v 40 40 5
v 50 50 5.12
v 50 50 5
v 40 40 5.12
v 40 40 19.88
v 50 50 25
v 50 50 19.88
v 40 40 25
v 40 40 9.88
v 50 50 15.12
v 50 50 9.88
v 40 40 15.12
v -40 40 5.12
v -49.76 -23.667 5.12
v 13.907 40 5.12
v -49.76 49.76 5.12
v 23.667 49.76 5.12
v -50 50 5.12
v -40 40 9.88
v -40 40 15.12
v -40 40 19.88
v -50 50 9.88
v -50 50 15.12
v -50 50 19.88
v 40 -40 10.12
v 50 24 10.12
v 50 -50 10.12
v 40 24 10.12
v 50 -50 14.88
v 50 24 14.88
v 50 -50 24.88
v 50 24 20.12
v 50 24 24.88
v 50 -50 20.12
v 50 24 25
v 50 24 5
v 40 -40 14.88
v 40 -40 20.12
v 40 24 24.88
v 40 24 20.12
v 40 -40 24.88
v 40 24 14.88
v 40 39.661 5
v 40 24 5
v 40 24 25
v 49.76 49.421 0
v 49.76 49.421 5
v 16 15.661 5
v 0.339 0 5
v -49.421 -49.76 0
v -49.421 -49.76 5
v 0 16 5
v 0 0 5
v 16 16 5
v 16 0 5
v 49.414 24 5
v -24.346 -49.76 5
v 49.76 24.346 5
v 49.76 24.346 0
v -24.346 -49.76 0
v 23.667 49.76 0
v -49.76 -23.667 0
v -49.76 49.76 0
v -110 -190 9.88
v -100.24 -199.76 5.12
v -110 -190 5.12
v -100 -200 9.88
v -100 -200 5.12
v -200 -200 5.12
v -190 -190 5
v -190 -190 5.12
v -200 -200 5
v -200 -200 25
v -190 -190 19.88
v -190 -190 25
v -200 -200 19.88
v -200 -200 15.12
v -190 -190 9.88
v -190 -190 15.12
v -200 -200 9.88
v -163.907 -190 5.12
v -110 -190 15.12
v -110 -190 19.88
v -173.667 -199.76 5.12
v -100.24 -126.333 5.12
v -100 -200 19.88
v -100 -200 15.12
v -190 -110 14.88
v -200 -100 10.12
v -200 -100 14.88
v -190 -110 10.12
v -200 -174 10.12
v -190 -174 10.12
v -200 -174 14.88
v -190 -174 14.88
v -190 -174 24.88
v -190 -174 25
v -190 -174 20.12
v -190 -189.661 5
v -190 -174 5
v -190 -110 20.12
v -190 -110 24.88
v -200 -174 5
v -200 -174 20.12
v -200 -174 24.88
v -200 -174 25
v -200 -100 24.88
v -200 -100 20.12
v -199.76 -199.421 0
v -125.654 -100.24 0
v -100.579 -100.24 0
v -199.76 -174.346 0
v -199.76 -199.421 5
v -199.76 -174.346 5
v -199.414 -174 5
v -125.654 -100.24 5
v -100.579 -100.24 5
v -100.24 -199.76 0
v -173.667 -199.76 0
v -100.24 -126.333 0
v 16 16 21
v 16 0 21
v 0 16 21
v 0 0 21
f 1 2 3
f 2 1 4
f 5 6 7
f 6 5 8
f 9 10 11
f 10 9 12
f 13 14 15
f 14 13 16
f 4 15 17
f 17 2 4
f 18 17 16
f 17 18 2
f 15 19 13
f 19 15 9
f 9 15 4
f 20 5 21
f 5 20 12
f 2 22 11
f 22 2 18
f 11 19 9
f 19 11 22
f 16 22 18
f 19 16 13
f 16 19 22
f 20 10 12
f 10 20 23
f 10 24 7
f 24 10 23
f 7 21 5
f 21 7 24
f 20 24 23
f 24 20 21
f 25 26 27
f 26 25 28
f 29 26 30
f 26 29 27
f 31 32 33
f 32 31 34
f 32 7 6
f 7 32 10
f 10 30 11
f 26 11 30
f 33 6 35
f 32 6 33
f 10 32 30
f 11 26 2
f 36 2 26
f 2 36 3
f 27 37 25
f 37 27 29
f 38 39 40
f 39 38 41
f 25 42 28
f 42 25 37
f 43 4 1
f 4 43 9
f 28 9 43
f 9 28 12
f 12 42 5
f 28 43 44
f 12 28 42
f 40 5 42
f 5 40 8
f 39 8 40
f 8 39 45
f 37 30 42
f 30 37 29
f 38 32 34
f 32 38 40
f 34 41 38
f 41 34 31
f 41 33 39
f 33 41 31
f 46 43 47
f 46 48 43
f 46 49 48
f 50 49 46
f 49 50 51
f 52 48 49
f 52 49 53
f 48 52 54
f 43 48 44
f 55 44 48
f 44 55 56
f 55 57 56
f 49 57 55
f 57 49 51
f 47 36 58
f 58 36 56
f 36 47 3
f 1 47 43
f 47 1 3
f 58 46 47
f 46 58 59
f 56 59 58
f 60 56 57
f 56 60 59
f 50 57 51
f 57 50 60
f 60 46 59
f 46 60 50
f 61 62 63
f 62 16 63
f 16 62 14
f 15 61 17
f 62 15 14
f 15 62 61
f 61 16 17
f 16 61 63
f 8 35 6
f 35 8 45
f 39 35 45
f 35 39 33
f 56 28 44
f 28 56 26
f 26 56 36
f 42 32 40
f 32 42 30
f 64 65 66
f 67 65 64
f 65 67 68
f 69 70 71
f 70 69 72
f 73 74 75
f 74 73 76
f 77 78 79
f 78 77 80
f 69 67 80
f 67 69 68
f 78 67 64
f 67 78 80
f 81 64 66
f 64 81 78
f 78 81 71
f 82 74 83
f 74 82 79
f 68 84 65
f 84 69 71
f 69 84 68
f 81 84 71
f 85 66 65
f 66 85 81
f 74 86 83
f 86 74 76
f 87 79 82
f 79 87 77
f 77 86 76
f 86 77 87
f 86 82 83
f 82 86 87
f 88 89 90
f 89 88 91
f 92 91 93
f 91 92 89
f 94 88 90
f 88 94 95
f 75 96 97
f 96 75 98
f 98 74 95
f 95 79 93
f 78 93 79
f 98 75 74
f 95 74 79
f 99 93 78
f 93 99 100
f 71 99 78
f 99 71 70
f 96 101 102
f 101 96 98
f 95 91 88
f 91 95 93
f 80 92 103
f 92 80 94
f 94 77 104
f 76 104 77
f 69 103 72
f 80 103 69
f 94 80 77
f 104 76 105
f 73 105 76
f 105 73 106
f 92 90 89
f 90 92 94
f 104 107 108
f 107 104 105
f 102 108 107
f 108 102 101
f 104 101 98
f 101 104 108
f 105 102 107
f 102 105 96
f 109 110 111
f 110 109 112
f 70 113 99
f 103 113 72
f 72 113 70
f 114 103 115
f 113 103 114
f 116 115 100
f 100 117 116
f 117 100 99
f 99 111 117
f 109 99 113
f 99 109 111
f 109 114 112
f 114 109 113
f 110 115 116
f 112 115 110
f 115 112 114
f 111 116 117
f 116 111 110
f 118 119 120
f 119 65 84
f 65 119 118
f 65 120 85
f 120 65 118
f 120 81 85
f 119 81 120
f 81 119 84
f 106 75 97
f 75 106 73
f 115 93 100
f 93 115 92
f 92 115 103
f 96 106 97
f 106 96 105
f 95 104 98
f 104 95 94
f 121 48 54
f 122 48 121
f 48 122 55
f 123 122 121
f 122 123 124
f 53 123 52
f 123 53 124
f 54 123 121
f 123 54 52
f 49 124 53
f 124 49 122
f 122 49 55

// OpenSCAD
//
// Tangible Math Project - Square Packing
// Overlapping corners: third model concept
//
// Andrew H. Volk, Liberty University.  Released under CC BY 4.0.
// Release 1.0.0, 23 October 2026.  Source unchanged from the working copy of
// 9 April 2026; only this header has been added.
//
// Two congruent plates, each a trapezoid plus a right triangle, carrying
// raised trapezoidal border bars that interleave on alternating layers.
// Sliding one plate diagonally across the other shrinks the enclosed square
// continuously, so a single pair covers every case rather than one frame per
// case.  This is the blue part in the Research Week prototype photograph.
//
// Revision history, from the project repository:
//   2026-03-30  first working version: tri_leg 40 mm, border_h 10 mm,
//               tile pitch (100 - 2*10)/4 = 20 mm, BOSL2 dependency,
//               each piece emitted as a separate solid
//   2026-03-31  every red piece and every blue piece unioned into one solid
//               per half - a printability fix, not a geometry change
//   2026-04-09  tri_leg 40 -> 105/sqrt(2) so the overlap diagonal spans the
//               full corner-to-corner distance; border_h 10 -> 5 mm, which is
//               the universal bar height the final SOLIDWORKS family uses;
//               tile pitch divisor 4 -> 5, so the tile drops 20 -> 16 mm;
//               BOSL2 dependency removed so the file needs no library
//
// Clearances here are 0.24 mm, looser than the 0.16 mm and 0.08 mm the final
// SOLIDWORKS family settled on.  They are centred: red_margin_z and
// blue_margin_z are removed from the stacked bars in Z, layer0_xy_margin from
// the base plates in XY.
//
// The companion STL, overlapping-corners-pair.stl, was exported with
//   openscad -D 'show_cube=false' -D 'slideblue=112' //            -o overlapping-corners-pair.stl overlapping-corners.scad
// show_cube is a preview aid: it parks a loose tile on top of the red plate,
// which is not a print layout.  slideblue separates the two halves; the file
// default of 150 gives a 250 mm footprint, which leaves no room for a brim on
// a 256 mm bed, so the published export uses 112 for a 212 mm footprint.
//

//include <BOSL2/std.scad>;

side      = 100;   // overall square size
tri_leg   = 105/sqrt(2);    // controls the size of the two right triangles
thickness = 5;     // base thickness in mm

border_w      = 10;    // inward depth of each trapezoidal border
border_h      = 5;    // nominal height of each border layer
border_layers = 5;     // total possible layers in the design

red_margin_z      = 0.24;  // centered Z margin for raised red layers
blue_margin_z     = 0.24;  // centered Z margin for raised blue layers
layer0_xy_margin  = 0.24;  // centered XY margin for all layer-0 partition pieces
smallcube         = (side-2*border_w)/5; // squares for packing up to 16
slideblue         = 150;   // shifts all blue shapes by [-slideblue, -slideblue, 0]

show_layer5       = false; // toggle fifth layer on/off
show_cube         = true;  // toggle cube on/off
show_blue         = true;  // toggle all blue geometry on/off

// Extra height so layer-0 right triangles reach the raised trapezoids
red_right_triangle_extra_z  = red_margin_z/2;
blue_right_triangle_extra_z = blue_margin_z/2;

module poly2d(pts, xy_margin=0) {
    if (xy_margin > 0)
        offset(delta=-xy_margin) polygon(points=pts);
    else
        polygon(points=pts);
}

module piece(pts, c, h=thickness, xy_margin=0, shift=[0,0,0]) {
    color(c)
        translate(shift)
            linear_extrude(height=h)
                poly2d(pts, xy_margin);
}

module stacked_trapezoid_bars(
    pts,
    c,
    keep_layers=[1,2,3,4,5],
    layer_h=10,
    z0=0,
    z_margin=0,
    shift=[0,0,0]
) {
    actual_h = layer_h - z_margin;
    z_shift  = z_margin / 2;

    for (layer_num = keep_layers) {
        color(c)
            translate([
                shift[0],
                shift[1],
                shift[2] + z0 + (layer_num-1)*layer_h + z_shift
            ])
                linear_extrude(height=actual_h)
                    polygon(points=pts);
    }
}

module prism_from_poly(pts, c, z0=0, h=50, shift=[0,0,0]) {
    color(c)
        translate([shift[0], shift[1], shift[2] + z0])
            linear_extrude(height=h)
                polygon(points=pts);
}

module square_partition(side=100, tri_leg=40, thickness=5) {
    s = side;
    t = tri_leg;
    w = border_w;

    blue_shift = [-slideblue, -slideblue, 0];
    red_shift  = [0,0,0];

    // Layer-0 square partition
    blue_trapezoid = [
        [-s/2, -s/2],
        [-s/2,  s/2 - t],
        [-s/2 + t,  s/2],
        [ s/2,  s/2]
    ];

    red_trapezoid = [
        [-s/2, -s/2],
        [ s/2 - t, -s/2],
        [ s/2, -s/2 + t],
        [ s/2,  s/2]
    ];

    top_left_triangle = [
        [-s/2,  s/2],
        [-s/2,  s/2 - t],
        [-s/2 + t,  s/2]
    ];

    bottom_right_triangle = [
        [ s/2, -s/2],
        [ s/2 - t, -s/2],
        [ s/2, -s/2 + t]
    ];

    // Raised trapezoidal edge footprints
    top_bar = [
        [-s/2,  s/2],
        [ s/2,  s/2],
        [ s/2 - w,  s/2 - w],
        [-s/2 + w,  s/2 - w]
    ];

    right_bar = [
        [ s/2,  s/2],
        [ s/2, -s/2],
        [ s/2 - w, -s/2 + w],
        [ s/2 - w,  s/2 - w]
    ];

    bottom_bar = [
        [ s/2, -s/2],
        [-s/2, -s/2],
        [-s/2 + w, -s/2 + w],
        [ s/2 - w, -s/2 + w]
    ];

    left_bar = [
        [-s/2, -s/2],
        [-s/2,  s/2],
        [-s/2 + w,  s/2 - w],
        [-s/2 + w, -s/2 + w]
    ];

    // Corner wedges
    top_right_wedge = [
        [ s/2,      s/2     ],
        [ s/2,      s/2 - w ],
        [ s/2 - w,  s/2 - w ]
    ];

    bottom_left_wedge = [
        [-s/2,     -s/2     ],
        [-s/2 + w, -s/2 + w ],
        [-s/2,     -s/2 + w ]
    ];

    // Adjacent rectangular prisms along the border
    top_right_rect = [
        [ s/2 - w,  s/2 - w ],
        [ s/2,      s/2 - w ],
        [ s/2,      s/2 - w - smallcube ],
        [ s/2 - w,  s/2 - w - smallcube ]
    ];

    bottom_left_rect = [
        [-s/2,      -s/2 + w ],
        [-s/2 + w,  -s/2 + w ],
        [-s/2 + w,  -s/2 + w + smallcube ],
        [-s/2,      -s/2 + w + smallcube ]
    ];

    odd_layers  = show_layer5 ? [1,3,5] : [1,3];
    even_layers = [2,4];

    z0 = thickness;
    active_top_layer    = show_layer5 ? 5 : 4;
    total_border_height = border_h * active_top_layer;

    // Union all red into one solid
    union() {
        piece(red_trapezoid, "red", thickness, layer0_xy_margin, red_shift);

        piece(
            top_left_triangle,
            "red",
            thickness + red_right_triangle_extra_z,
            layer0_xy_margin,
            red_shift
        );

        stacked_trapezoid_bars(top_bar,   "red", odd_layers,  border_h, z0, red_margin_z, red_shift);
        stacked_trapezoid_bars(right_bar, "red", even_layers, border_h, z0, red_margin_z, red_shift);

        prism_from_poly(top_right_wedge, "red", z0, total_border_height, red_shift);
        prism_from_poly(top_right_rect,  "red", z0, total_border_height, red_shift);
    }

    // Union all blue into one solid
    if (show_blue)
        union() {
            piece(blue_trapezoid, "blue", thickness, layer0_xy_margin, blue_shift);

            piece(
                bottom_right_triangle,
                "blue",
                thickness + blue_right_triangle_extra_z,
                layer0_xy_margin,
                blue_shift
            );

            stacked_trapezoid_bars(bottom_bar, "blue", odd_layers,  border_h, z0, blue_margin_z, blue_shift);
            stacked_trapezoid_bars(left_bar,   "blue", even_layers, border_h, z0, blue_margin_z, blue_shift);

            prism_from_poly(bottom_left_wedge, "blue", z0, total_border_height, blue_shift);
            prism_from_poly(bottom_left_rect,  "blue", z0, total_border_height, blue_shift);
        }
}

square_partition(side=side, tri_leg=tri_leg, thickness=thickness);

if (show_cube)
    translate([0,0,thickness])
        cube(smallcube);
